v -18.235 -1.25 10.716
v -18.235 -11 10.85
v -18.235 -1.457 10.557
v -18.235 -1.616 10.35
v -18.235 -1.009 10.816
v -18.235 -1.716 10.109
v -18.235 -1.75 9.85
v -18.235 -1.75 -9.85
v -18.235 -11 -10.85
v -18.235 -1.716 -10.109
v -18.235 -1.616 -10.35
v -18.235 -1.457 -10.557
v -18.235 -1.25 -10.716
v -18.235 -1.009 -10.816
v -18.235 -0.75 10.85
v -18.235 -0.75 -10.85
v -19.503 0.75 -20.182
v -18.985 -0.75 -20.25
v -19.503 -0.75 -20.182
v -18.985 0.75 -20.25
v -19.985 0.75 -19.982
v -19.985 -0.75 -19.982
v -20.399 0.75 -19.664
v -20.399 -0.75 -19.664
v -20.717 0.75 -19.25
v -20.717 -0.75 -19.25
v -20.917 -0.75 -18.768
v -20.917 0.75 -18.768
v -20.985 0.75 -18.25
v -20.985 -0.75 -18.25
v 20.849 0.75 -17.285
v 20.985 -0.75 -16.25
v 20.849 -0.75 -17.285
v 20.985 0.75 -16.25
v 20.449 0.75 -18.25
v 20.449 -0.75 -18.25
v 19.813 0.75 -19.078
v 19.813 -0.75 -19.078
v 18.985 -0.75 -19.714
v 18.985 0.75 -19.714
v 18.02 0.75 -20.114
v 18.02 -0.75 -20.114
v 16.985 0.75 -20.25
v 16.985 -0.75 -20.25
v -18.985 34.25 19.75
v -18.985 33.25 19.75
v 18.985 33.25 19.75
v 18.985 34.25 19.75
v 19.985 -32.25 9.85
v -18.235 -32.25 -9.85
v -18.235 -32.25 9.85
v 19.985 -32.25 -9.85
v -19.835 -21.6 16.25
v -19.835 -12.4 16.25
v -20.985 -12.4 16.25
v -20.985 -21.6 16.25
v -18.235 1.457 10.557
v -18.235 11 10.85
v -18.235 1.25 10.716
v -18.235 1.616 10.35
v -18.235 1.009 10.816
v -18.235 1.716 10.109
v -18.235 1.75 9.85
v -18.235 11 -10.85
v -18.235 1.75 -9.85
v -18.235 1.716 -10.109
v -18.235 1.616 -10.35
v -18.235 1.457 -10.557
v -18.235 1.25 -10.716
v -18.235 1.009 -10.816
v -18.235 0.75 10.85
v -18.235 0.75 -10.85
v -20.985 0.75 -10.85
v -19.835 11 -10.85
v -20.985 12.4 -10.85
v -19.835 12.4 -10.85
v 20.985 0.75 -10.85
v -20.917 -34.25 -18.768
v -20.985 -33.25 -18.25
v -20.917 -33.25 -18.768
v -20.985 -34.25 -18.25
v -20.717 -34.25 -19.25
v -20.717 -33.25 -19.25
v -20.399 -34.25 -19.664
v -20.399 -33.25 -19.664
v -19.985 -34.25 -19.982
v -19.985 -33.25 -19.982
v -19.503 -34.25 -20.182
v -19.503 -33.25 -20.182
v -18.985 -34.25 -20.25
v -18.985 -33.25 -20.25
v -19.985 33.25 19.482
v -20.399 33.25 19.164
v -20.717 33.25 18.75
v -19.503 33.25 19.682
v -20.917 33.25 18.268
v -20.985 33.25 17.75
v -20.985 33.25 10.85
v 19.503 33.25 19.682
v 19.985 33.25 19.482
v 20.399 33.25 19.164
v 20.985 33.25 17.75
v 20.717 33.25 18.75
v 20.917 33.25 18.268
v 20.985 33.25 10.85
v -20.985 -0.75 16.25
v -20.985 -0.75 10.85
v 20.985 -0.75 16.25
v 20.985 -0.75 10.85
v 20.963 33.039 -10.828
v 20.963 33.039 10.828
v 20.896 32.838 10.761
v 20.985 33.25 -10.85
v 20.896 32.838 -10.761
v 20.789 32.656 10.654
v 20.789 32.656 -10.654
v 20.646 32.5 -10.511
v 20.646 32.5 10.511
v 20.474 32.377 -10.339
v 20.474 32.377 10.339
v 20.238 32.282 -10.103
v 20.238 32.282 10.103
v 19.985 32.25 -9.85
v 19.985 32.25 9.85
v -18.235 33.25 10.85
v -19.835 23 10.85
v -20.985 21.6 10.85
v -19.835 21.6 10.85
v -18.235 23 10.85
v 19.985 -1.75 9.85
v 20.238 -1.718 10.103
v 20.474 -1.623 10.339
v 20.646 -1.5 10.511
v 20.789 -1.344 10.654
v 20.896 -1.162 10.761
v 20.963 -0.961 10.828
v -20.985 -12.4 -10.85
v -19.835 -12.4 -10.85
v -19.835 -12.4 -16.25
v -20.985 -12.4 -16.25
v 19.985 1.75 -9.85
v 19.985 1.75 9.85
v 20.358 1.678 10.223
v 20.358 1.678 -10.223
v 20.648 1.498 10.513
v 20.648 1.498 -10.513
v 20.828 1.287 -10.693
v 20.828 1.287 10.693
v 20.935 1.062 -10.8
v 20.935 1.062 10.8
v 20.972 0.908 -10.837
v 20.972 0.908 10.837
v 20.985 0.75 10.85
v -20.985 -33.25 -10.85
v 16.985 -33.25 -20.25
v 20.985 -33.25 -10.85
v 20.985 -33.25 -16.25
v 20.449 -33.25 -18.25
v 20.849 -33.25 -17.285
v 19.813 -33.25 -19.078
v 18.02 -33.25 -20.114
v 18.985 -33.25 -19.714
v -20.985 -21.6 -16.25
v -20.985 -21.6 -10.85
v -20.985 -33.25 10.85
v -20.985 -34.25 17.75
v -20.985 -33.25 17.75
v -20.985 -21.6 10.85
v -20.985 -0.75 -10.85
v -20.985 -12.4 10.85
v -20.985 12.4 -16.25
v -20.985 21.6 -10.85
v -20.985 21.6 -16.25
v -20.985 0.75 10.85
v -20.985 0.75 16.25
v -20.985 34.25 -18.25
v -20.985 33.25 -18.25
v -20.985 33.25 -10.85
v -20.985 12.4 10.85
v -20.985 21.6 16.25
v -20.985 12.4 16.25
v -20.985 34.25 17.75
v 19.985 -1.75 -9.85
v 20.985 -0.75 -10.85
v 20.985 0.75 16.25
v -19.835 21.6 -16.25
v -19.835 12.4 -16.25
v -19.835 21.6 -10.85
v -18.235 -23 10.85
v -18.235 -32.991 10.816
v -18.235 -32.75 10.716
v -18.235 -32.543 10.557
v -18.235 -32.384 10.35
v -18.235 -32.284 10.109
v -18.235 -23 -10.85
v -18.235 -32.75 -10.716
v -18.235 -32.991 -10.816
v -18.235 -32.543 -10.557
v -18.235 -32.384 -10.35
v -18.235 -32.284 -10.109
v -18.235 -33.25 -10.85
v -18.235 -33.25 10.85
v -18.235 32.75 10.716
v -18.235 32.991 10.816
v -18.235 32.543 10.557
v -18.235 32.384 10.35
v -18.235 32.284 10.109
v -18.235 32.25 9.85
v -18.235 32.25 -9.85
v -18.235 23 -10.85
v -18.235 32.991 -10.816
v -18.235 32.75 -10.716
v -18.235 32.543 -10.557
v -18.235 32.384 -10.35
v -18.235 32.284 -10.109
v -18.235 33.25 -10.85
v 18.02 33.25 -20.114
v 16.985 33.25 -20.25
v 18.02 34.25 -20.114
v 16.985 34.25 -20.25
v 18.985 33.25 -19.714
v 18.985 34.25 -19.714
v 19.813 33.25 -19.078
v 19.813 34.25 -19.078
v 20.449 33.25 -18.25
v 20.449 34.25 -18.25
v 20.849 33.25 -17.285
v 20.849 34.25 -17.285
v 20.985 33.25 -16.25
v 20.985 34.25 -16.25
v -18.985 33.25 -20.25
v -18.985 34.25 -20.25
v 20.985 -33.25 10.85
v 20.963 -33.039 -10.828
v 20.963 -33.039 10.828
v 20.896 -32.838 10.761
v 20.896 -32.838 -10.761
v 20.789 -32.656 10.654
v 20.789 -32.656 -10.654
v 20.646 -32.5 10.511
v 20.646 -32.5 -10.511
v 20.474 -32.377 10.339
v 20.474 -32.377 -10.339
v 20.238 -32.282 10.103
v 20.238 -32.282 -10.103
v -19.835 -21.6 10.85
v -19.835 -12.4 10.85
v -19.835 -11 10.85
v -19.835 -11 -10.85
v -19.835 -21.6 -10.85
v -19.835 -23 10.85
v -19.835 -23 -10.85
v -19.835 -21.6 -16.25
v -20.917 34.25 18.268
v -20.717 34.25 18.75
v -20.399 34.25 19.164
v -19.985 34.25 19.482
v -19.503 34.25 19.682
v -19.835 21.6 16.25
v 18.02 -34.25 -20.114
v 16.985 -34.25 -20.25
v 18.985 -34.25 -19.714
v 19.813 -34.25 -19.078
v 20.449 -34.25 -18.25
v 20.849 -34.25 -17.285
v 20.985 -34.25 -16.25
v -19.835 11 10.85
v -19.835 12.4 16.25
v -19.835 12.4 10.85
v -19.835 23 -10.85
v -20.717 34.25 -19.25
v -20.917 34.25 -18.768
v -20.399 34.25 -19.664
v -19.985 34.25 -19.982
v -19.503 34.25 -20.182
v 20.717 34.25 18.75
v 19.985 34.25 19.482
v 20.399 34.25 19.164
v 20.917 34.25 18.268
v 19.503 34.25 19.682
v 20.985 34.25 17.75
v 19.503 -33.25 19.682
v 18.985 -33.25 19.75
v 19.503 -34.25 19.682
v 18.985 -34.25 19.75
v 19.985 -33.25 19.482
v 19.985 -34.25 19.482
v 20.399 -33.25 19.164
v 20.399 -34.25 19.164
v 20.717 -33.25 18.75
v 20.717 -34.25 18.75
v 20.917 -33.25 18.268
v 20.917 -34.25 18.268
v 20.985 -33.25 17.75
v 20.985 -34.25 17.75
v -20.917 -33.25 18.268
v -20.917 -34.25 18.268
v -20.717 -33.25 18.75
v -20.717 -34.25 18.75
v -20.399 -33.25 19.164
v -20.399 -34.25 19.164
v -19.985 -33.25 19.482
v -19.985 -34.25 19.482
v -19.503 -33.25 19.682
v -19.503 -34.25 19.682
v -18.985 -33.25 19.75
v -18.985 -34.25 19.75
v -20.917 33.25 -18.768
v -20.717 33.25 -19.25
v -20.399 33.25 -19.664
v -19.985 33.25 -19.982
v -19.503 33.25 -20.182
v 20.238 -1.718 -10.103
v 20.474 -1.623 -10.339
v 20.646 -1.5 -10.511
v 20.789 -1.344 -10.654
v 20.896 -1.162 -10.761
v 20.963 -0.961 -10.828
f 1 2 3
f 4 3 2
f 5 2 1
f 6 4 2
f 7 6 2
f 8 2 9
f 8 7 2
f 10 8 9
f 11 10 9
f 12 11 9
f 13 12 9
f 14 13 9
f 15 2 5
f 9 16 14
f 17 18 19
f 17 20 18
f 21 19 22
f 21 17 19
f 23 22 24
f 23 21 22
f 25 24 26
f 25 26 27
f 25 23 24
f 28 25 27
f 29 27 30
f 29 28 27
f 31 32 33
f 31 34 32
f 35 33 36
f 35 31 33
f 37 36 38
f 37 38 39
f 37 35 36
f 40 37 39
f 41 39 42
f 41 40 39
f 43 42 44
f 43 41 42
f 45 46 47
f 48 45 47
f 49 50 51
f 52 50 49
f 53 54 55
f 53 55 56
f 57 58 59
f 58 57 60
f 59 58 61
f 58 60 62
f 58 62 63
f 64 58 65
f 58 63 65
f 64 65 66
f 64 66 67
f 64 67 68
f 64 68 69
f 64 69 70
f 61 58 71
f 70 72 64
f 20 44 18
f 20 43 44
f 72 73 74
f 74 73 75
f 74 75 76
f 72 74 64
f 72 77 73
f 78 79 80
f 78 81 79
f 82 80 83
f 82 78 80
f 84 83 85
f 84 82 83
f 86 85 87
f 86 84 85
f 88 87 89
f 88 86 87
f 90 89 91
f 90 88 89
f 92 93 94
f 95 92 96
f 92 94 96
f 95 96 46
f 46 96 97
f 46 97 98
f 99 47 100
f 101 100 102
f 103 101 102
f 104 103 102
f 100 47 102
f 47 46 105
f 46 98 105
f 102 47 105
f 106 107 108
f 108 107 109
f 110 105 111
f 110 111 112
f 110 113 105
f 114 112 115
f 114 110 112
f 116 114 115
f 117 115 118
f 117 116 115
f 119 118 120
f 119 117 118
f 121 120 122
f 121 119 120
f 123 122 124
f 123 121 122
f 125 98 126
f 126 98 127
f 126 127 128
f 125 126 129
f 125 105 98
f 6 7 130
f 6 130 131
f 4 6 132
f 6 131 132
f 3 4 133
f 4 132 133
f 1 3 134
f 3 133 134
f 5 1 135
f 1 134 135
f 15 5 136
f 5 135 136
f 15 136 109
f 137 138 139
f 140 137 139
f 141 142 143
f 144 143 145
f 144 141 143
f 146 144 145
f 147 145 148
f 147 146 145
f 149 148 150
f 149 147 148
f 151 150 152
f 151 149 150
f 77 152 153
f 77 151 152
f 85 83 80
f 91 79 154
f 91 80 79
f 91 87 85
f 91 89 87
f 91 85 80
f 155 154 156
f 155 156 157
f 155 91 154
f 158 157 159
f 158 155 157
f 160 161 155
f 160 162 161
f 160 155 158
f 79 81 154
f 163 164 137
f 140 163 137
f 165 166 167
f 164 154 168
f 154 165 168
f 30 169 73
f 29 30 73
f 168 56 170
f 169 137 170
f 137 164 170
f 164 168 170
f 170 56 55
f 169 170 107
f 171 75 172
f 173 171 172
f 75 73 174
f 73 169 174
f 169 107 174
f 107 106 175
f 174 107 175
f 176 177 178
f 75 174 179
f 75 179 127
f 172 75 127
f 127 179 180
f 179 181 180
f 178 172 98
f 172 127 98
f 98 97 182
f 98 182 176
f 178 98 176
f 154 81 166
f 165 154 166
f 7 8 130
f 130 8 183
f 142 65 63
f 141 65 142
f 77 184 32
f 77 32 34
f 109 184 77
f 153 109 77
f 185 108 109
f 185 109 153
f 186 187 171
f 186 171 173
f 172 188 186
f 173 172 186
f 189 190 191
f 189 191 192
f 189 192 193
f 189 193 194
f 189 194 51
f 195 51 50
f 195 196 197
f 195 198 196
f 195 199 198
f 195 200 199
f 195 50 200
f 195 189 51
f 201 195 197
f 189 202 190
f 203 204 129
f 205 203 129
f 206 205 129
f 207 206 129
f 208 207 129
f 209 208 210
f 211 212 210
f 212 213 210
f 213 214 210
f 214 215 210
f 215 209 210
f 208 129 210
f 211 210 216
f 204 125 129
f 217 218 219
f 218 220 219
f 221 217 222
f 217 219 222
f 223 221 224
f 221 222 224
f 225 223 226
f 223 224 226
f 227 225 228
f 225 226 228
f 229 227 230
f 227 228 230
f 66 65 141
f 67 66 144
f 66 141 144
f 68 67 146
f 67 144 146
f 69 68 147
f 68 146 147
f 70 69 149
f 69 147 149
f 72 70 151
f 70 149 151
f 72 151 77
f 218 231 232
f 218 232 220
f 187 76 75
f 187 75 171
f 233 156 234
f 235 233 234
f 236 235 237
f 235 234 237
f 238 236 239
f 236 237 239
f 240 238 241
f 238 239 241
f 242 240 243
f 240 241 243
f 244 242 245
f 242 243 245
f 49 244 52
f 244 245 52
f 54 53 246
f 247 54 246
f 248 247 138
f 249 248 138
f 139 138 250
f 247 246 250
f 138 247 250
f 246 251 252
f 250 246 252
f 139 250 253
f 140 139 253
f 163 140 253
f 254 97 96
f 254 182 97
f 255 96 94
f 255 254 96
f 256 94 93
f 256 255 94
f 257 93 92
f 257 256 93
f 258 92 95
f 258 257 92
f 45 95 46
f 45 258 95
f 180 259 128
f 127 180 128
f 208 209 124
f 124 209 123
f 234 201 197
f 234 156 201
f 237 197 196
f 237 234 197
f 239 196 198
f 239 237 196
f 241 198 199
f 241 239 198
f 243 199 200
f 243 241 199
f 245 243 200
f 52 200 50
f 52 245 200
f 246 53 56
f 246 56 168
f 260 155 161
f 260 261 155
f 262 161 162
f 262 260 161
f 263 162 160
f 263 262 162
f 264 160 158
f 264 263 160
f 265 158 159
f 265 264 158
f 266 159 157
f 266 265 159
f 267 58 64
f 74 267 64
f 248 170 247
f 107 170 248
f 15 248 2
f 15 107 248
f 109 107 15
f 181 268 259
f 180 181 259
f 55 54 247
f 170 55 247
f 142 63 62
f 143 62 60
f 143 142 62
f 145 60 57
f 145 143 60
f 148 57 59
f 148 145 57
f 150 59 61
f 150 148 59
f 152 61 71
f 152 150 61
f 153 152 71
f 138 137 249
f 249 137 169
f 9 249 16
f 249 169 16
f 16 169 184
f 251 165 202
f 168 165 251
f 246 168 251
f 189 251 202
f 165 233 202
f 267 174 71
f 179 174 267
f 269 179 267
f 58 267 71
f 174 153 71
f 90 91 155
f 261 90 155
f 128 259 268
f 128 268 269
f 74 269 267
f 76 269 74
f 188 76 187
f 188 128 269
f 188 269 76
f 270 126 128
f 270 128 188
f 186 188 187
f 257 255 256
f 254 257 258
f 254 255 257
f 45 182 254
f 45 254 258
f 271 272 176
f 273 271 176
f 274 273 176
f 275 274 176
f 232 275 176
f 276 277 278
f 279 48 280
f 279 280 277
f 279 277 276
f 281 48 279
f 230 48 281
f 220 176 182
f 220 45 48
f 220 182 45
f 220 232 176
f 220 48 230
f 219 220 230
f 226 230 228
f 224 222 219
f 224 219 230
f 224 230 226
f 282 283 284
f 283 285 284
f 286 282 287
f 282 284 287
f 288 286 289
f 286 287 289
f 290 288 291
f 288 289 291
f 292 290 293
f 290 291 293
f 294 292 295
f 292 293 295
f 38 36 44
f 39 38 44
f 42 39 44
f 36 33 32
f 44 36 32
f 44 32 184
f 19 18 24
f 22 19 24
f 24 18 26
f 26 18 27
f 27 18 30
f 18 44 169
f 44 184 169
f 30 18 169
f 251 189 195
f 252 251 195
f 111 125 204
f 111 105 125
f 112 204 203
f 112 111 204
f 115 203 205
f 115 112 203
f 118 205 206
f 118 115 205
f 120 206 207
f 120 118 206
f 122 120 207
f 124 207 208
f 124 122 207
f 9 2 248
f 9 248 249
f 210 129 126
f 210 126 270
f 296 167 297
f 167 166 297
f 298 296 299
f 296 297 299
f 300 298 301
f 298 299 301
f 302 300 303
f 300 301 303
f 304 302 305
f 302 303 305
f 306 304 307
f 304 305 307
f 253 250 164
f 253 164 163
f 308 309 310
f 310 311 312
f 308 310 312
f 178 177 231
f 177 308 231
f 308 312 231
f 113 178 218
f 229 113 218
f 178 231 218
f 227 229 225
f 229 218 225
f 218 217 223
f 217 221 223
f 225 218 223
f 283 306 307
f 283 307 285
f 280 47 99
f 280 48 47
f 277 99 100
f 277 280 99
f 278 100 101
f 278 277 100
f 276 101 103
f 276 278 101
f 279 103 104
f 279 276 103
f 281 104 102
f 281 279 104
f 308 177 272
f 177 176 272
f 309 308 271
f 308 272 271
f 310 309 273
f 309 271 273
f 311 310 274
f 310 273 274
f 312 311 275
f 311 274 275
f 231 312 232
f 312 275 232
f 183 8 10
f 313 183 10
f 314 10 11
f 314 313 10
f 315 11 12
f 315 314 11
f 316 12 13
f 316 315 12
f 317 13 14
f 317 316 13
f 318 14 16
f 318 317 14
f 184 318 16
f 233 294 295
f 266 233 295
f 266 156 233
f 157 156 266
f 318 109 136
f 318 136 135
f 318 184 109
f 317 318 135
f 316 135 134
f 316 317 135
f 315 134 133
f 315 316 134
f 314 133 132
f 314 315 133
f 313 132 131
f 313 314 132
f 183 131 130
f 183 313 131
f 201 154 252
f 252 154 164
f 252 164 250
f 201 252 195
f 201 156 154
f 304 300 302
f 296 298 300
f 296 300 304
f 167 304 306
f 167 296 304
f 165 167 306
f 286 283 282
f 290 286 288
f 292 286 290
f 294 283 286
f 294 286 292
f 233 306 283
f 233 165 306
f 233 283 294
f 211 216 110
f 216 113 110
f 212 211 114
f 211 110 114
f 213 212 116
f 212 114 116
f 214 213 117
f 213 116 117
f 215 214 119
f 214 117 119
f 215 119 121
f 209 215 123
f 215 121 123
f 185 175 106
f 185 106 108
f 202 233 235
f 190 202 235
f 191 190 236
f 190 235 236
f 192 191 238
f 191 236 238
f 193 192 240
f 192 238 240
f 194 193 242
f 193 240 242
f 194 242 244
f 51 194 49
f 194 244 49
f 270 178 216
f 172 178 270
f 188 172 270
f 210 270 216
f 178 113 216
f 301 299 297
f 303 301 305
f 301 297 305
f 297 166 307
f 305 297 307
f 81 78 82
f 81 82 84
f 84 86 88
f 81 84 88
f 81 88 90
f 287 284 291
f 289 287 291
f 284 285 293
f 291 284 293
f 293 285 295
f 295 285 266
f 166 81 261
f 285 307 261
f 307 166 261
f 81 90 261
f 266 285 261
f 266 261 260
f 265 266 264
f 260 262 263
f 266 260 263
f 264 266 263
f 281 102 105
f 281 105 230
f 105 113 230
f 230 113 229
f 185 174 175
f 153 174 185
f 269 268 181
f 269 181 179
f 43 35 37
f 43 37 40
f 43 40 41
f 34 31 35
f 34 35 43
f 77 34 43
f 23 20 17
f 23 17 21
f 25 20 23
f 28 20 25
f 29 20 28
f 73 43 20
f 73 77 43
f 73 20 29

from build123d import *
from OCP.BRepFilletAPI import BRepFilletAPI_MakeFillet

# Parameters (mm, degrees)
SKETCH1_W              = 41.97
SKETCH1_H              = 32.5
BOSS_EXTRUDE1_DEPTH    = 0.75
SKETCH2_W              = 41.97
SKETCH2_H              = 21.7
BOSS_EXTRUDE2_DEPTH    = 1.75
SKETCH4_W              = 2.75
SKETCH4_H              = 21.7
BOSS_EXTRUDE3_DEPTH    = 31.5
SKETCH5_W              = 21.7
SKETCH5_H              = 12
CUT_EXTRUDE1_DEPTH     = 1.6
SKETCH6_W              = 32.5
SKETCH6_H              = 9.2
BOSS_EXTRUDE4_DEPTH    = 1.15
SKETCH7_W              = 41.97
SKETCH7_H              = 21.7
BOSS_EXTRUDE5_DEPTH    = 1
SKETCH8_W              = 41.97
SKETCH8_H              = 40
BOSS_EXTRUDE6_DEPTH    = 1
FILLET1_R              = 4
FILLET1_R_2            = 2
FILLET1_R_3            = 1
FILLET1_OF_MIRROR2_R   = 4
FILLET1_OF_MIRROR2_R_2 = 2
FILLET1_OF_MIRROR2_R_3 = 1
FILLET2_R              = 1
SKETCH9_W              = 41.97
SKETCH9_H              = 1.5
BOSS_EXTRUDE7_DEPTH    = 4
FILLET4_R              = 4
FILLET5_R              = 2


with BuildPart() as part:
    # Sketch1 → Boss-Extrude1 (new, symmetric)
    with BuildSketch(Plane(origin=(0, 0, 0), x_dir=(1, 0, 0), z_dir=(0, 1, 0))):
        Rectangle(SKETCH1_W, SKETCH1_H)
    extrude(amount=BOSS_EXTRUDE1_DEPTH, both=True)

    # Sketch2 → Boss-Extrude2 (add, symmetric)
    with BuildSketch(Plane(origin=(0, 0, 0), x_dir=(1, 0, 0), z_dir=(0, 1, 0))):
        Rectangle(SKETCH2_W, SKETCH2_H)
    extrude(amount=BOSS_EXTRUDE2_DEPTH, both=True)

    # Sketch4 → Boss-Extrude3 (add)
    with BuildSketch(Plane(origin=(0, 0.75, 0), x_dir=(1, 0, 0), z_dir=(0, 1, 0))):
        with Locations((-19.61, 0)):
            Rectangle(SKETCH4_W, SKETCH4_H)
    boss_extrude3 = extrude(amount=BOSS_EXTRUDE3_DEPTH)

    # Sketch5 → Cut-Extrude1 (cut)
    with BuildSketch(Plane(origin=(-18.235, 0, 0), x_dir=(0, 0, -1), z_dir=(1, 0, 0))):
        with Locations((0, 17)):
            Rectangle(SKETCH5_W, SKETCH5_H)
    cut_extrude1 = extrude(amount=-CUT_EXTRUDE1_DEPTH, mode=Mode.SUBTRACT)

    # Sketch6 → Boss-Extrude4 (add)
    with BuildSketch(Plane(origin=(-19.835, 0, 0), x_dir=(0, 0, -1), z_dir=(1, 0, 0))):
        with Locations((0, 17)):
            Rectangle(SKETCH6_W, SKETCH6_H)
    boss_extrude4 = extrude(amount=-BOSS_EXTRUDE4_DEPTH)

    # Sketch7 → Boss-Extrude5 (add)
    with BuildSketch(Plane(origin=(0, 32.25, 0), x_dir=(1, 0, 0), z_dir=(0, 1, 0))):
        Rectangle(SKETCH7_W, SKETCH7_H)
    boss_extrude5 = extrude(amount=BOSS_EXTRUDE5_DEPTH)

    # Sketch8 → Boss-Extrude6 (add)
    with BuildSketch(Plane(origin=(0, 33.25, 0), x_dir=(1, 0, 0), z_dir=(0, 1, 0))):
        with Locations((0, 0.25)):
            Rectangle(SKETCH8_W, SKETCH8_H)
    boss_extrude6 = extrude(amount=BOSS_EXTRUDE6_DEPTH)

    # Fillet1
    fillet1_edges_1 = [part.edges().sort_by_distance(p)[0] for p in [
        (20.985, 33.75, -20.25),
    ]]
    fillet1_edges_2 = [part.edges().sort_by_distance(p)[0] for p in [
        (-20.985, 33.75, -20.25),
        (-20.985, 33.75, 19.75),
        (20.985, 33.75, 19.75),
    ]]
    fillet1_edges_3 = [part.edges().sort_by_distance(p)[0] for p in [
        (20.985, 32.25, 0),
        (1.375, 32.25, 10.85),
        (1.375, 32.25, -10.85),
    ]]
    fillet1 = BRepFilletAPI_MakeFillet(part.part.solid().wrapped)
    for e in fillet1_edges_1:
        fillet1.Add(FILLET1_R - 0.0001, e.wrapped)
    for e in fillet1_edges_2:
        fillet1.Add(FILLET1_R_2 - 0.0001, e.wrapped)
    for e in fillet1_edges_3:
        fillet1.Add(FILLET1_R_3 - 0.0001, e.wrapped)
    add(Compound.cast(fillet1.Shape()), mode=Mode.REPLACE)  # a hair under: the kernel refuses the full size

    # Mirror2: Boss-Extrude3, Cut-Extrude1, Boss-Extrude4, Boss-Extrude5, Boss-Extrude6 across plane
    add(boss_extrude3.mirror(Plane.ZX))
    add(cut_extrude1.mirror(Plane.ZX), mode=Mode.SUBTRACT)
    add(boss_extrude4.mirror(Plane.ZX))
    add(boss_extrude5.mirror(Plane.ZX))
    add(boss_extrude6.mirror(Plane.ZX))

    # Fillet1 of Mirror2
    fillet1_of_mirror2_edges_1 = [part.edges().sort_by_distance(p)[0] for p in [
        (20.985, -33.75, -20.25),
    ]]
    fillet1_of_mirror2_edges_2 = [part.edges().sort_by_distance(p)[0] for p in [
        (-20.985, -33.75, -20.25),
        (-20.985, -33.75, 19.75),
        (20.985, -33.75, 19.75),
    ]]
    fillet1_of_mirror2_edges_3 = [part.edges().sort_by_distance(p)[0] for p in [
        (20.985, -32.25, 0),
        (1.375, -32.25, 10.85),
        (1.375, -32.25, -10.85),
    ]]
    fillet1_of_mirror2 = BRepFilletAPI_MakeFillet(part.part.solid().wrapped)
    for e in fillet1_of_mirror2_edges_1:
        fillet1_of_mirror2.Add(FILLET1_OF_MIRROR2_R - 0.0001, e.wrapped)
    for e in fillet1_of_mirror2_edges_2:
        fillet1_of_mirror2.Add(FILLET1_OF_MIRROR2_R_2 - 0.0001, e.wrapped)
    for e in fillet1_of_mirror2_edges_3:
        fillet1_of_mirror2.Add(FILLET1_OF_MIRROR2_R_3 - 0.0001, e.wrapped)
    add(Compound.cast(fillet1_of_mirror2.Shape()), mode=Mode.REPLACE)  # a hair under: the kernel refuses the full size

    # Fillet2
    fillet2_edges = [part.edges().sort_by_distance(p)[0] for p in [
        (20.985, -1.75, 0),
        (20.985, 1.75, 0),
        (1.375, -1.75, 10.85),
        (1.375, -1.75, -10.85),
        (1.375, 1.75, 10.85),
        (1.375, 1.75, -10.85),
    ]]
    fillet(fillet2_edges, radius=FILLET2_R - 0.0001)  # a hair under: the kernel refuses the full size

    # Sketch9 → Boss-Extrude7 (add)
    with BuildSketch(Plane(origin=(0, 0, -16.25), x_dir=(-1, 0, 0), z_dir=(0, 0, -1))):
        Rectangle(SKETCH9_W, SKETCH9_H)
    extrude(amount=BOSS_EXTRUDE7_DEPTH)

    # Fillet4
    fillet4_edges = [part.edges().sort_by_distance(p)[0] for p in [
        (20.985, 0, -20.25),
    ]]
    fillet(fillet4_edges, radius=FILLET4_R)

    # Fillet5
    fillet5_edges = [part.edges().sort_by_distance(p)[0] for p in [
        (-20.985, 0, -20.25),
    ]]
    fillet(fillet5_edges, radius=FILLET5_R)


solid = part.part
